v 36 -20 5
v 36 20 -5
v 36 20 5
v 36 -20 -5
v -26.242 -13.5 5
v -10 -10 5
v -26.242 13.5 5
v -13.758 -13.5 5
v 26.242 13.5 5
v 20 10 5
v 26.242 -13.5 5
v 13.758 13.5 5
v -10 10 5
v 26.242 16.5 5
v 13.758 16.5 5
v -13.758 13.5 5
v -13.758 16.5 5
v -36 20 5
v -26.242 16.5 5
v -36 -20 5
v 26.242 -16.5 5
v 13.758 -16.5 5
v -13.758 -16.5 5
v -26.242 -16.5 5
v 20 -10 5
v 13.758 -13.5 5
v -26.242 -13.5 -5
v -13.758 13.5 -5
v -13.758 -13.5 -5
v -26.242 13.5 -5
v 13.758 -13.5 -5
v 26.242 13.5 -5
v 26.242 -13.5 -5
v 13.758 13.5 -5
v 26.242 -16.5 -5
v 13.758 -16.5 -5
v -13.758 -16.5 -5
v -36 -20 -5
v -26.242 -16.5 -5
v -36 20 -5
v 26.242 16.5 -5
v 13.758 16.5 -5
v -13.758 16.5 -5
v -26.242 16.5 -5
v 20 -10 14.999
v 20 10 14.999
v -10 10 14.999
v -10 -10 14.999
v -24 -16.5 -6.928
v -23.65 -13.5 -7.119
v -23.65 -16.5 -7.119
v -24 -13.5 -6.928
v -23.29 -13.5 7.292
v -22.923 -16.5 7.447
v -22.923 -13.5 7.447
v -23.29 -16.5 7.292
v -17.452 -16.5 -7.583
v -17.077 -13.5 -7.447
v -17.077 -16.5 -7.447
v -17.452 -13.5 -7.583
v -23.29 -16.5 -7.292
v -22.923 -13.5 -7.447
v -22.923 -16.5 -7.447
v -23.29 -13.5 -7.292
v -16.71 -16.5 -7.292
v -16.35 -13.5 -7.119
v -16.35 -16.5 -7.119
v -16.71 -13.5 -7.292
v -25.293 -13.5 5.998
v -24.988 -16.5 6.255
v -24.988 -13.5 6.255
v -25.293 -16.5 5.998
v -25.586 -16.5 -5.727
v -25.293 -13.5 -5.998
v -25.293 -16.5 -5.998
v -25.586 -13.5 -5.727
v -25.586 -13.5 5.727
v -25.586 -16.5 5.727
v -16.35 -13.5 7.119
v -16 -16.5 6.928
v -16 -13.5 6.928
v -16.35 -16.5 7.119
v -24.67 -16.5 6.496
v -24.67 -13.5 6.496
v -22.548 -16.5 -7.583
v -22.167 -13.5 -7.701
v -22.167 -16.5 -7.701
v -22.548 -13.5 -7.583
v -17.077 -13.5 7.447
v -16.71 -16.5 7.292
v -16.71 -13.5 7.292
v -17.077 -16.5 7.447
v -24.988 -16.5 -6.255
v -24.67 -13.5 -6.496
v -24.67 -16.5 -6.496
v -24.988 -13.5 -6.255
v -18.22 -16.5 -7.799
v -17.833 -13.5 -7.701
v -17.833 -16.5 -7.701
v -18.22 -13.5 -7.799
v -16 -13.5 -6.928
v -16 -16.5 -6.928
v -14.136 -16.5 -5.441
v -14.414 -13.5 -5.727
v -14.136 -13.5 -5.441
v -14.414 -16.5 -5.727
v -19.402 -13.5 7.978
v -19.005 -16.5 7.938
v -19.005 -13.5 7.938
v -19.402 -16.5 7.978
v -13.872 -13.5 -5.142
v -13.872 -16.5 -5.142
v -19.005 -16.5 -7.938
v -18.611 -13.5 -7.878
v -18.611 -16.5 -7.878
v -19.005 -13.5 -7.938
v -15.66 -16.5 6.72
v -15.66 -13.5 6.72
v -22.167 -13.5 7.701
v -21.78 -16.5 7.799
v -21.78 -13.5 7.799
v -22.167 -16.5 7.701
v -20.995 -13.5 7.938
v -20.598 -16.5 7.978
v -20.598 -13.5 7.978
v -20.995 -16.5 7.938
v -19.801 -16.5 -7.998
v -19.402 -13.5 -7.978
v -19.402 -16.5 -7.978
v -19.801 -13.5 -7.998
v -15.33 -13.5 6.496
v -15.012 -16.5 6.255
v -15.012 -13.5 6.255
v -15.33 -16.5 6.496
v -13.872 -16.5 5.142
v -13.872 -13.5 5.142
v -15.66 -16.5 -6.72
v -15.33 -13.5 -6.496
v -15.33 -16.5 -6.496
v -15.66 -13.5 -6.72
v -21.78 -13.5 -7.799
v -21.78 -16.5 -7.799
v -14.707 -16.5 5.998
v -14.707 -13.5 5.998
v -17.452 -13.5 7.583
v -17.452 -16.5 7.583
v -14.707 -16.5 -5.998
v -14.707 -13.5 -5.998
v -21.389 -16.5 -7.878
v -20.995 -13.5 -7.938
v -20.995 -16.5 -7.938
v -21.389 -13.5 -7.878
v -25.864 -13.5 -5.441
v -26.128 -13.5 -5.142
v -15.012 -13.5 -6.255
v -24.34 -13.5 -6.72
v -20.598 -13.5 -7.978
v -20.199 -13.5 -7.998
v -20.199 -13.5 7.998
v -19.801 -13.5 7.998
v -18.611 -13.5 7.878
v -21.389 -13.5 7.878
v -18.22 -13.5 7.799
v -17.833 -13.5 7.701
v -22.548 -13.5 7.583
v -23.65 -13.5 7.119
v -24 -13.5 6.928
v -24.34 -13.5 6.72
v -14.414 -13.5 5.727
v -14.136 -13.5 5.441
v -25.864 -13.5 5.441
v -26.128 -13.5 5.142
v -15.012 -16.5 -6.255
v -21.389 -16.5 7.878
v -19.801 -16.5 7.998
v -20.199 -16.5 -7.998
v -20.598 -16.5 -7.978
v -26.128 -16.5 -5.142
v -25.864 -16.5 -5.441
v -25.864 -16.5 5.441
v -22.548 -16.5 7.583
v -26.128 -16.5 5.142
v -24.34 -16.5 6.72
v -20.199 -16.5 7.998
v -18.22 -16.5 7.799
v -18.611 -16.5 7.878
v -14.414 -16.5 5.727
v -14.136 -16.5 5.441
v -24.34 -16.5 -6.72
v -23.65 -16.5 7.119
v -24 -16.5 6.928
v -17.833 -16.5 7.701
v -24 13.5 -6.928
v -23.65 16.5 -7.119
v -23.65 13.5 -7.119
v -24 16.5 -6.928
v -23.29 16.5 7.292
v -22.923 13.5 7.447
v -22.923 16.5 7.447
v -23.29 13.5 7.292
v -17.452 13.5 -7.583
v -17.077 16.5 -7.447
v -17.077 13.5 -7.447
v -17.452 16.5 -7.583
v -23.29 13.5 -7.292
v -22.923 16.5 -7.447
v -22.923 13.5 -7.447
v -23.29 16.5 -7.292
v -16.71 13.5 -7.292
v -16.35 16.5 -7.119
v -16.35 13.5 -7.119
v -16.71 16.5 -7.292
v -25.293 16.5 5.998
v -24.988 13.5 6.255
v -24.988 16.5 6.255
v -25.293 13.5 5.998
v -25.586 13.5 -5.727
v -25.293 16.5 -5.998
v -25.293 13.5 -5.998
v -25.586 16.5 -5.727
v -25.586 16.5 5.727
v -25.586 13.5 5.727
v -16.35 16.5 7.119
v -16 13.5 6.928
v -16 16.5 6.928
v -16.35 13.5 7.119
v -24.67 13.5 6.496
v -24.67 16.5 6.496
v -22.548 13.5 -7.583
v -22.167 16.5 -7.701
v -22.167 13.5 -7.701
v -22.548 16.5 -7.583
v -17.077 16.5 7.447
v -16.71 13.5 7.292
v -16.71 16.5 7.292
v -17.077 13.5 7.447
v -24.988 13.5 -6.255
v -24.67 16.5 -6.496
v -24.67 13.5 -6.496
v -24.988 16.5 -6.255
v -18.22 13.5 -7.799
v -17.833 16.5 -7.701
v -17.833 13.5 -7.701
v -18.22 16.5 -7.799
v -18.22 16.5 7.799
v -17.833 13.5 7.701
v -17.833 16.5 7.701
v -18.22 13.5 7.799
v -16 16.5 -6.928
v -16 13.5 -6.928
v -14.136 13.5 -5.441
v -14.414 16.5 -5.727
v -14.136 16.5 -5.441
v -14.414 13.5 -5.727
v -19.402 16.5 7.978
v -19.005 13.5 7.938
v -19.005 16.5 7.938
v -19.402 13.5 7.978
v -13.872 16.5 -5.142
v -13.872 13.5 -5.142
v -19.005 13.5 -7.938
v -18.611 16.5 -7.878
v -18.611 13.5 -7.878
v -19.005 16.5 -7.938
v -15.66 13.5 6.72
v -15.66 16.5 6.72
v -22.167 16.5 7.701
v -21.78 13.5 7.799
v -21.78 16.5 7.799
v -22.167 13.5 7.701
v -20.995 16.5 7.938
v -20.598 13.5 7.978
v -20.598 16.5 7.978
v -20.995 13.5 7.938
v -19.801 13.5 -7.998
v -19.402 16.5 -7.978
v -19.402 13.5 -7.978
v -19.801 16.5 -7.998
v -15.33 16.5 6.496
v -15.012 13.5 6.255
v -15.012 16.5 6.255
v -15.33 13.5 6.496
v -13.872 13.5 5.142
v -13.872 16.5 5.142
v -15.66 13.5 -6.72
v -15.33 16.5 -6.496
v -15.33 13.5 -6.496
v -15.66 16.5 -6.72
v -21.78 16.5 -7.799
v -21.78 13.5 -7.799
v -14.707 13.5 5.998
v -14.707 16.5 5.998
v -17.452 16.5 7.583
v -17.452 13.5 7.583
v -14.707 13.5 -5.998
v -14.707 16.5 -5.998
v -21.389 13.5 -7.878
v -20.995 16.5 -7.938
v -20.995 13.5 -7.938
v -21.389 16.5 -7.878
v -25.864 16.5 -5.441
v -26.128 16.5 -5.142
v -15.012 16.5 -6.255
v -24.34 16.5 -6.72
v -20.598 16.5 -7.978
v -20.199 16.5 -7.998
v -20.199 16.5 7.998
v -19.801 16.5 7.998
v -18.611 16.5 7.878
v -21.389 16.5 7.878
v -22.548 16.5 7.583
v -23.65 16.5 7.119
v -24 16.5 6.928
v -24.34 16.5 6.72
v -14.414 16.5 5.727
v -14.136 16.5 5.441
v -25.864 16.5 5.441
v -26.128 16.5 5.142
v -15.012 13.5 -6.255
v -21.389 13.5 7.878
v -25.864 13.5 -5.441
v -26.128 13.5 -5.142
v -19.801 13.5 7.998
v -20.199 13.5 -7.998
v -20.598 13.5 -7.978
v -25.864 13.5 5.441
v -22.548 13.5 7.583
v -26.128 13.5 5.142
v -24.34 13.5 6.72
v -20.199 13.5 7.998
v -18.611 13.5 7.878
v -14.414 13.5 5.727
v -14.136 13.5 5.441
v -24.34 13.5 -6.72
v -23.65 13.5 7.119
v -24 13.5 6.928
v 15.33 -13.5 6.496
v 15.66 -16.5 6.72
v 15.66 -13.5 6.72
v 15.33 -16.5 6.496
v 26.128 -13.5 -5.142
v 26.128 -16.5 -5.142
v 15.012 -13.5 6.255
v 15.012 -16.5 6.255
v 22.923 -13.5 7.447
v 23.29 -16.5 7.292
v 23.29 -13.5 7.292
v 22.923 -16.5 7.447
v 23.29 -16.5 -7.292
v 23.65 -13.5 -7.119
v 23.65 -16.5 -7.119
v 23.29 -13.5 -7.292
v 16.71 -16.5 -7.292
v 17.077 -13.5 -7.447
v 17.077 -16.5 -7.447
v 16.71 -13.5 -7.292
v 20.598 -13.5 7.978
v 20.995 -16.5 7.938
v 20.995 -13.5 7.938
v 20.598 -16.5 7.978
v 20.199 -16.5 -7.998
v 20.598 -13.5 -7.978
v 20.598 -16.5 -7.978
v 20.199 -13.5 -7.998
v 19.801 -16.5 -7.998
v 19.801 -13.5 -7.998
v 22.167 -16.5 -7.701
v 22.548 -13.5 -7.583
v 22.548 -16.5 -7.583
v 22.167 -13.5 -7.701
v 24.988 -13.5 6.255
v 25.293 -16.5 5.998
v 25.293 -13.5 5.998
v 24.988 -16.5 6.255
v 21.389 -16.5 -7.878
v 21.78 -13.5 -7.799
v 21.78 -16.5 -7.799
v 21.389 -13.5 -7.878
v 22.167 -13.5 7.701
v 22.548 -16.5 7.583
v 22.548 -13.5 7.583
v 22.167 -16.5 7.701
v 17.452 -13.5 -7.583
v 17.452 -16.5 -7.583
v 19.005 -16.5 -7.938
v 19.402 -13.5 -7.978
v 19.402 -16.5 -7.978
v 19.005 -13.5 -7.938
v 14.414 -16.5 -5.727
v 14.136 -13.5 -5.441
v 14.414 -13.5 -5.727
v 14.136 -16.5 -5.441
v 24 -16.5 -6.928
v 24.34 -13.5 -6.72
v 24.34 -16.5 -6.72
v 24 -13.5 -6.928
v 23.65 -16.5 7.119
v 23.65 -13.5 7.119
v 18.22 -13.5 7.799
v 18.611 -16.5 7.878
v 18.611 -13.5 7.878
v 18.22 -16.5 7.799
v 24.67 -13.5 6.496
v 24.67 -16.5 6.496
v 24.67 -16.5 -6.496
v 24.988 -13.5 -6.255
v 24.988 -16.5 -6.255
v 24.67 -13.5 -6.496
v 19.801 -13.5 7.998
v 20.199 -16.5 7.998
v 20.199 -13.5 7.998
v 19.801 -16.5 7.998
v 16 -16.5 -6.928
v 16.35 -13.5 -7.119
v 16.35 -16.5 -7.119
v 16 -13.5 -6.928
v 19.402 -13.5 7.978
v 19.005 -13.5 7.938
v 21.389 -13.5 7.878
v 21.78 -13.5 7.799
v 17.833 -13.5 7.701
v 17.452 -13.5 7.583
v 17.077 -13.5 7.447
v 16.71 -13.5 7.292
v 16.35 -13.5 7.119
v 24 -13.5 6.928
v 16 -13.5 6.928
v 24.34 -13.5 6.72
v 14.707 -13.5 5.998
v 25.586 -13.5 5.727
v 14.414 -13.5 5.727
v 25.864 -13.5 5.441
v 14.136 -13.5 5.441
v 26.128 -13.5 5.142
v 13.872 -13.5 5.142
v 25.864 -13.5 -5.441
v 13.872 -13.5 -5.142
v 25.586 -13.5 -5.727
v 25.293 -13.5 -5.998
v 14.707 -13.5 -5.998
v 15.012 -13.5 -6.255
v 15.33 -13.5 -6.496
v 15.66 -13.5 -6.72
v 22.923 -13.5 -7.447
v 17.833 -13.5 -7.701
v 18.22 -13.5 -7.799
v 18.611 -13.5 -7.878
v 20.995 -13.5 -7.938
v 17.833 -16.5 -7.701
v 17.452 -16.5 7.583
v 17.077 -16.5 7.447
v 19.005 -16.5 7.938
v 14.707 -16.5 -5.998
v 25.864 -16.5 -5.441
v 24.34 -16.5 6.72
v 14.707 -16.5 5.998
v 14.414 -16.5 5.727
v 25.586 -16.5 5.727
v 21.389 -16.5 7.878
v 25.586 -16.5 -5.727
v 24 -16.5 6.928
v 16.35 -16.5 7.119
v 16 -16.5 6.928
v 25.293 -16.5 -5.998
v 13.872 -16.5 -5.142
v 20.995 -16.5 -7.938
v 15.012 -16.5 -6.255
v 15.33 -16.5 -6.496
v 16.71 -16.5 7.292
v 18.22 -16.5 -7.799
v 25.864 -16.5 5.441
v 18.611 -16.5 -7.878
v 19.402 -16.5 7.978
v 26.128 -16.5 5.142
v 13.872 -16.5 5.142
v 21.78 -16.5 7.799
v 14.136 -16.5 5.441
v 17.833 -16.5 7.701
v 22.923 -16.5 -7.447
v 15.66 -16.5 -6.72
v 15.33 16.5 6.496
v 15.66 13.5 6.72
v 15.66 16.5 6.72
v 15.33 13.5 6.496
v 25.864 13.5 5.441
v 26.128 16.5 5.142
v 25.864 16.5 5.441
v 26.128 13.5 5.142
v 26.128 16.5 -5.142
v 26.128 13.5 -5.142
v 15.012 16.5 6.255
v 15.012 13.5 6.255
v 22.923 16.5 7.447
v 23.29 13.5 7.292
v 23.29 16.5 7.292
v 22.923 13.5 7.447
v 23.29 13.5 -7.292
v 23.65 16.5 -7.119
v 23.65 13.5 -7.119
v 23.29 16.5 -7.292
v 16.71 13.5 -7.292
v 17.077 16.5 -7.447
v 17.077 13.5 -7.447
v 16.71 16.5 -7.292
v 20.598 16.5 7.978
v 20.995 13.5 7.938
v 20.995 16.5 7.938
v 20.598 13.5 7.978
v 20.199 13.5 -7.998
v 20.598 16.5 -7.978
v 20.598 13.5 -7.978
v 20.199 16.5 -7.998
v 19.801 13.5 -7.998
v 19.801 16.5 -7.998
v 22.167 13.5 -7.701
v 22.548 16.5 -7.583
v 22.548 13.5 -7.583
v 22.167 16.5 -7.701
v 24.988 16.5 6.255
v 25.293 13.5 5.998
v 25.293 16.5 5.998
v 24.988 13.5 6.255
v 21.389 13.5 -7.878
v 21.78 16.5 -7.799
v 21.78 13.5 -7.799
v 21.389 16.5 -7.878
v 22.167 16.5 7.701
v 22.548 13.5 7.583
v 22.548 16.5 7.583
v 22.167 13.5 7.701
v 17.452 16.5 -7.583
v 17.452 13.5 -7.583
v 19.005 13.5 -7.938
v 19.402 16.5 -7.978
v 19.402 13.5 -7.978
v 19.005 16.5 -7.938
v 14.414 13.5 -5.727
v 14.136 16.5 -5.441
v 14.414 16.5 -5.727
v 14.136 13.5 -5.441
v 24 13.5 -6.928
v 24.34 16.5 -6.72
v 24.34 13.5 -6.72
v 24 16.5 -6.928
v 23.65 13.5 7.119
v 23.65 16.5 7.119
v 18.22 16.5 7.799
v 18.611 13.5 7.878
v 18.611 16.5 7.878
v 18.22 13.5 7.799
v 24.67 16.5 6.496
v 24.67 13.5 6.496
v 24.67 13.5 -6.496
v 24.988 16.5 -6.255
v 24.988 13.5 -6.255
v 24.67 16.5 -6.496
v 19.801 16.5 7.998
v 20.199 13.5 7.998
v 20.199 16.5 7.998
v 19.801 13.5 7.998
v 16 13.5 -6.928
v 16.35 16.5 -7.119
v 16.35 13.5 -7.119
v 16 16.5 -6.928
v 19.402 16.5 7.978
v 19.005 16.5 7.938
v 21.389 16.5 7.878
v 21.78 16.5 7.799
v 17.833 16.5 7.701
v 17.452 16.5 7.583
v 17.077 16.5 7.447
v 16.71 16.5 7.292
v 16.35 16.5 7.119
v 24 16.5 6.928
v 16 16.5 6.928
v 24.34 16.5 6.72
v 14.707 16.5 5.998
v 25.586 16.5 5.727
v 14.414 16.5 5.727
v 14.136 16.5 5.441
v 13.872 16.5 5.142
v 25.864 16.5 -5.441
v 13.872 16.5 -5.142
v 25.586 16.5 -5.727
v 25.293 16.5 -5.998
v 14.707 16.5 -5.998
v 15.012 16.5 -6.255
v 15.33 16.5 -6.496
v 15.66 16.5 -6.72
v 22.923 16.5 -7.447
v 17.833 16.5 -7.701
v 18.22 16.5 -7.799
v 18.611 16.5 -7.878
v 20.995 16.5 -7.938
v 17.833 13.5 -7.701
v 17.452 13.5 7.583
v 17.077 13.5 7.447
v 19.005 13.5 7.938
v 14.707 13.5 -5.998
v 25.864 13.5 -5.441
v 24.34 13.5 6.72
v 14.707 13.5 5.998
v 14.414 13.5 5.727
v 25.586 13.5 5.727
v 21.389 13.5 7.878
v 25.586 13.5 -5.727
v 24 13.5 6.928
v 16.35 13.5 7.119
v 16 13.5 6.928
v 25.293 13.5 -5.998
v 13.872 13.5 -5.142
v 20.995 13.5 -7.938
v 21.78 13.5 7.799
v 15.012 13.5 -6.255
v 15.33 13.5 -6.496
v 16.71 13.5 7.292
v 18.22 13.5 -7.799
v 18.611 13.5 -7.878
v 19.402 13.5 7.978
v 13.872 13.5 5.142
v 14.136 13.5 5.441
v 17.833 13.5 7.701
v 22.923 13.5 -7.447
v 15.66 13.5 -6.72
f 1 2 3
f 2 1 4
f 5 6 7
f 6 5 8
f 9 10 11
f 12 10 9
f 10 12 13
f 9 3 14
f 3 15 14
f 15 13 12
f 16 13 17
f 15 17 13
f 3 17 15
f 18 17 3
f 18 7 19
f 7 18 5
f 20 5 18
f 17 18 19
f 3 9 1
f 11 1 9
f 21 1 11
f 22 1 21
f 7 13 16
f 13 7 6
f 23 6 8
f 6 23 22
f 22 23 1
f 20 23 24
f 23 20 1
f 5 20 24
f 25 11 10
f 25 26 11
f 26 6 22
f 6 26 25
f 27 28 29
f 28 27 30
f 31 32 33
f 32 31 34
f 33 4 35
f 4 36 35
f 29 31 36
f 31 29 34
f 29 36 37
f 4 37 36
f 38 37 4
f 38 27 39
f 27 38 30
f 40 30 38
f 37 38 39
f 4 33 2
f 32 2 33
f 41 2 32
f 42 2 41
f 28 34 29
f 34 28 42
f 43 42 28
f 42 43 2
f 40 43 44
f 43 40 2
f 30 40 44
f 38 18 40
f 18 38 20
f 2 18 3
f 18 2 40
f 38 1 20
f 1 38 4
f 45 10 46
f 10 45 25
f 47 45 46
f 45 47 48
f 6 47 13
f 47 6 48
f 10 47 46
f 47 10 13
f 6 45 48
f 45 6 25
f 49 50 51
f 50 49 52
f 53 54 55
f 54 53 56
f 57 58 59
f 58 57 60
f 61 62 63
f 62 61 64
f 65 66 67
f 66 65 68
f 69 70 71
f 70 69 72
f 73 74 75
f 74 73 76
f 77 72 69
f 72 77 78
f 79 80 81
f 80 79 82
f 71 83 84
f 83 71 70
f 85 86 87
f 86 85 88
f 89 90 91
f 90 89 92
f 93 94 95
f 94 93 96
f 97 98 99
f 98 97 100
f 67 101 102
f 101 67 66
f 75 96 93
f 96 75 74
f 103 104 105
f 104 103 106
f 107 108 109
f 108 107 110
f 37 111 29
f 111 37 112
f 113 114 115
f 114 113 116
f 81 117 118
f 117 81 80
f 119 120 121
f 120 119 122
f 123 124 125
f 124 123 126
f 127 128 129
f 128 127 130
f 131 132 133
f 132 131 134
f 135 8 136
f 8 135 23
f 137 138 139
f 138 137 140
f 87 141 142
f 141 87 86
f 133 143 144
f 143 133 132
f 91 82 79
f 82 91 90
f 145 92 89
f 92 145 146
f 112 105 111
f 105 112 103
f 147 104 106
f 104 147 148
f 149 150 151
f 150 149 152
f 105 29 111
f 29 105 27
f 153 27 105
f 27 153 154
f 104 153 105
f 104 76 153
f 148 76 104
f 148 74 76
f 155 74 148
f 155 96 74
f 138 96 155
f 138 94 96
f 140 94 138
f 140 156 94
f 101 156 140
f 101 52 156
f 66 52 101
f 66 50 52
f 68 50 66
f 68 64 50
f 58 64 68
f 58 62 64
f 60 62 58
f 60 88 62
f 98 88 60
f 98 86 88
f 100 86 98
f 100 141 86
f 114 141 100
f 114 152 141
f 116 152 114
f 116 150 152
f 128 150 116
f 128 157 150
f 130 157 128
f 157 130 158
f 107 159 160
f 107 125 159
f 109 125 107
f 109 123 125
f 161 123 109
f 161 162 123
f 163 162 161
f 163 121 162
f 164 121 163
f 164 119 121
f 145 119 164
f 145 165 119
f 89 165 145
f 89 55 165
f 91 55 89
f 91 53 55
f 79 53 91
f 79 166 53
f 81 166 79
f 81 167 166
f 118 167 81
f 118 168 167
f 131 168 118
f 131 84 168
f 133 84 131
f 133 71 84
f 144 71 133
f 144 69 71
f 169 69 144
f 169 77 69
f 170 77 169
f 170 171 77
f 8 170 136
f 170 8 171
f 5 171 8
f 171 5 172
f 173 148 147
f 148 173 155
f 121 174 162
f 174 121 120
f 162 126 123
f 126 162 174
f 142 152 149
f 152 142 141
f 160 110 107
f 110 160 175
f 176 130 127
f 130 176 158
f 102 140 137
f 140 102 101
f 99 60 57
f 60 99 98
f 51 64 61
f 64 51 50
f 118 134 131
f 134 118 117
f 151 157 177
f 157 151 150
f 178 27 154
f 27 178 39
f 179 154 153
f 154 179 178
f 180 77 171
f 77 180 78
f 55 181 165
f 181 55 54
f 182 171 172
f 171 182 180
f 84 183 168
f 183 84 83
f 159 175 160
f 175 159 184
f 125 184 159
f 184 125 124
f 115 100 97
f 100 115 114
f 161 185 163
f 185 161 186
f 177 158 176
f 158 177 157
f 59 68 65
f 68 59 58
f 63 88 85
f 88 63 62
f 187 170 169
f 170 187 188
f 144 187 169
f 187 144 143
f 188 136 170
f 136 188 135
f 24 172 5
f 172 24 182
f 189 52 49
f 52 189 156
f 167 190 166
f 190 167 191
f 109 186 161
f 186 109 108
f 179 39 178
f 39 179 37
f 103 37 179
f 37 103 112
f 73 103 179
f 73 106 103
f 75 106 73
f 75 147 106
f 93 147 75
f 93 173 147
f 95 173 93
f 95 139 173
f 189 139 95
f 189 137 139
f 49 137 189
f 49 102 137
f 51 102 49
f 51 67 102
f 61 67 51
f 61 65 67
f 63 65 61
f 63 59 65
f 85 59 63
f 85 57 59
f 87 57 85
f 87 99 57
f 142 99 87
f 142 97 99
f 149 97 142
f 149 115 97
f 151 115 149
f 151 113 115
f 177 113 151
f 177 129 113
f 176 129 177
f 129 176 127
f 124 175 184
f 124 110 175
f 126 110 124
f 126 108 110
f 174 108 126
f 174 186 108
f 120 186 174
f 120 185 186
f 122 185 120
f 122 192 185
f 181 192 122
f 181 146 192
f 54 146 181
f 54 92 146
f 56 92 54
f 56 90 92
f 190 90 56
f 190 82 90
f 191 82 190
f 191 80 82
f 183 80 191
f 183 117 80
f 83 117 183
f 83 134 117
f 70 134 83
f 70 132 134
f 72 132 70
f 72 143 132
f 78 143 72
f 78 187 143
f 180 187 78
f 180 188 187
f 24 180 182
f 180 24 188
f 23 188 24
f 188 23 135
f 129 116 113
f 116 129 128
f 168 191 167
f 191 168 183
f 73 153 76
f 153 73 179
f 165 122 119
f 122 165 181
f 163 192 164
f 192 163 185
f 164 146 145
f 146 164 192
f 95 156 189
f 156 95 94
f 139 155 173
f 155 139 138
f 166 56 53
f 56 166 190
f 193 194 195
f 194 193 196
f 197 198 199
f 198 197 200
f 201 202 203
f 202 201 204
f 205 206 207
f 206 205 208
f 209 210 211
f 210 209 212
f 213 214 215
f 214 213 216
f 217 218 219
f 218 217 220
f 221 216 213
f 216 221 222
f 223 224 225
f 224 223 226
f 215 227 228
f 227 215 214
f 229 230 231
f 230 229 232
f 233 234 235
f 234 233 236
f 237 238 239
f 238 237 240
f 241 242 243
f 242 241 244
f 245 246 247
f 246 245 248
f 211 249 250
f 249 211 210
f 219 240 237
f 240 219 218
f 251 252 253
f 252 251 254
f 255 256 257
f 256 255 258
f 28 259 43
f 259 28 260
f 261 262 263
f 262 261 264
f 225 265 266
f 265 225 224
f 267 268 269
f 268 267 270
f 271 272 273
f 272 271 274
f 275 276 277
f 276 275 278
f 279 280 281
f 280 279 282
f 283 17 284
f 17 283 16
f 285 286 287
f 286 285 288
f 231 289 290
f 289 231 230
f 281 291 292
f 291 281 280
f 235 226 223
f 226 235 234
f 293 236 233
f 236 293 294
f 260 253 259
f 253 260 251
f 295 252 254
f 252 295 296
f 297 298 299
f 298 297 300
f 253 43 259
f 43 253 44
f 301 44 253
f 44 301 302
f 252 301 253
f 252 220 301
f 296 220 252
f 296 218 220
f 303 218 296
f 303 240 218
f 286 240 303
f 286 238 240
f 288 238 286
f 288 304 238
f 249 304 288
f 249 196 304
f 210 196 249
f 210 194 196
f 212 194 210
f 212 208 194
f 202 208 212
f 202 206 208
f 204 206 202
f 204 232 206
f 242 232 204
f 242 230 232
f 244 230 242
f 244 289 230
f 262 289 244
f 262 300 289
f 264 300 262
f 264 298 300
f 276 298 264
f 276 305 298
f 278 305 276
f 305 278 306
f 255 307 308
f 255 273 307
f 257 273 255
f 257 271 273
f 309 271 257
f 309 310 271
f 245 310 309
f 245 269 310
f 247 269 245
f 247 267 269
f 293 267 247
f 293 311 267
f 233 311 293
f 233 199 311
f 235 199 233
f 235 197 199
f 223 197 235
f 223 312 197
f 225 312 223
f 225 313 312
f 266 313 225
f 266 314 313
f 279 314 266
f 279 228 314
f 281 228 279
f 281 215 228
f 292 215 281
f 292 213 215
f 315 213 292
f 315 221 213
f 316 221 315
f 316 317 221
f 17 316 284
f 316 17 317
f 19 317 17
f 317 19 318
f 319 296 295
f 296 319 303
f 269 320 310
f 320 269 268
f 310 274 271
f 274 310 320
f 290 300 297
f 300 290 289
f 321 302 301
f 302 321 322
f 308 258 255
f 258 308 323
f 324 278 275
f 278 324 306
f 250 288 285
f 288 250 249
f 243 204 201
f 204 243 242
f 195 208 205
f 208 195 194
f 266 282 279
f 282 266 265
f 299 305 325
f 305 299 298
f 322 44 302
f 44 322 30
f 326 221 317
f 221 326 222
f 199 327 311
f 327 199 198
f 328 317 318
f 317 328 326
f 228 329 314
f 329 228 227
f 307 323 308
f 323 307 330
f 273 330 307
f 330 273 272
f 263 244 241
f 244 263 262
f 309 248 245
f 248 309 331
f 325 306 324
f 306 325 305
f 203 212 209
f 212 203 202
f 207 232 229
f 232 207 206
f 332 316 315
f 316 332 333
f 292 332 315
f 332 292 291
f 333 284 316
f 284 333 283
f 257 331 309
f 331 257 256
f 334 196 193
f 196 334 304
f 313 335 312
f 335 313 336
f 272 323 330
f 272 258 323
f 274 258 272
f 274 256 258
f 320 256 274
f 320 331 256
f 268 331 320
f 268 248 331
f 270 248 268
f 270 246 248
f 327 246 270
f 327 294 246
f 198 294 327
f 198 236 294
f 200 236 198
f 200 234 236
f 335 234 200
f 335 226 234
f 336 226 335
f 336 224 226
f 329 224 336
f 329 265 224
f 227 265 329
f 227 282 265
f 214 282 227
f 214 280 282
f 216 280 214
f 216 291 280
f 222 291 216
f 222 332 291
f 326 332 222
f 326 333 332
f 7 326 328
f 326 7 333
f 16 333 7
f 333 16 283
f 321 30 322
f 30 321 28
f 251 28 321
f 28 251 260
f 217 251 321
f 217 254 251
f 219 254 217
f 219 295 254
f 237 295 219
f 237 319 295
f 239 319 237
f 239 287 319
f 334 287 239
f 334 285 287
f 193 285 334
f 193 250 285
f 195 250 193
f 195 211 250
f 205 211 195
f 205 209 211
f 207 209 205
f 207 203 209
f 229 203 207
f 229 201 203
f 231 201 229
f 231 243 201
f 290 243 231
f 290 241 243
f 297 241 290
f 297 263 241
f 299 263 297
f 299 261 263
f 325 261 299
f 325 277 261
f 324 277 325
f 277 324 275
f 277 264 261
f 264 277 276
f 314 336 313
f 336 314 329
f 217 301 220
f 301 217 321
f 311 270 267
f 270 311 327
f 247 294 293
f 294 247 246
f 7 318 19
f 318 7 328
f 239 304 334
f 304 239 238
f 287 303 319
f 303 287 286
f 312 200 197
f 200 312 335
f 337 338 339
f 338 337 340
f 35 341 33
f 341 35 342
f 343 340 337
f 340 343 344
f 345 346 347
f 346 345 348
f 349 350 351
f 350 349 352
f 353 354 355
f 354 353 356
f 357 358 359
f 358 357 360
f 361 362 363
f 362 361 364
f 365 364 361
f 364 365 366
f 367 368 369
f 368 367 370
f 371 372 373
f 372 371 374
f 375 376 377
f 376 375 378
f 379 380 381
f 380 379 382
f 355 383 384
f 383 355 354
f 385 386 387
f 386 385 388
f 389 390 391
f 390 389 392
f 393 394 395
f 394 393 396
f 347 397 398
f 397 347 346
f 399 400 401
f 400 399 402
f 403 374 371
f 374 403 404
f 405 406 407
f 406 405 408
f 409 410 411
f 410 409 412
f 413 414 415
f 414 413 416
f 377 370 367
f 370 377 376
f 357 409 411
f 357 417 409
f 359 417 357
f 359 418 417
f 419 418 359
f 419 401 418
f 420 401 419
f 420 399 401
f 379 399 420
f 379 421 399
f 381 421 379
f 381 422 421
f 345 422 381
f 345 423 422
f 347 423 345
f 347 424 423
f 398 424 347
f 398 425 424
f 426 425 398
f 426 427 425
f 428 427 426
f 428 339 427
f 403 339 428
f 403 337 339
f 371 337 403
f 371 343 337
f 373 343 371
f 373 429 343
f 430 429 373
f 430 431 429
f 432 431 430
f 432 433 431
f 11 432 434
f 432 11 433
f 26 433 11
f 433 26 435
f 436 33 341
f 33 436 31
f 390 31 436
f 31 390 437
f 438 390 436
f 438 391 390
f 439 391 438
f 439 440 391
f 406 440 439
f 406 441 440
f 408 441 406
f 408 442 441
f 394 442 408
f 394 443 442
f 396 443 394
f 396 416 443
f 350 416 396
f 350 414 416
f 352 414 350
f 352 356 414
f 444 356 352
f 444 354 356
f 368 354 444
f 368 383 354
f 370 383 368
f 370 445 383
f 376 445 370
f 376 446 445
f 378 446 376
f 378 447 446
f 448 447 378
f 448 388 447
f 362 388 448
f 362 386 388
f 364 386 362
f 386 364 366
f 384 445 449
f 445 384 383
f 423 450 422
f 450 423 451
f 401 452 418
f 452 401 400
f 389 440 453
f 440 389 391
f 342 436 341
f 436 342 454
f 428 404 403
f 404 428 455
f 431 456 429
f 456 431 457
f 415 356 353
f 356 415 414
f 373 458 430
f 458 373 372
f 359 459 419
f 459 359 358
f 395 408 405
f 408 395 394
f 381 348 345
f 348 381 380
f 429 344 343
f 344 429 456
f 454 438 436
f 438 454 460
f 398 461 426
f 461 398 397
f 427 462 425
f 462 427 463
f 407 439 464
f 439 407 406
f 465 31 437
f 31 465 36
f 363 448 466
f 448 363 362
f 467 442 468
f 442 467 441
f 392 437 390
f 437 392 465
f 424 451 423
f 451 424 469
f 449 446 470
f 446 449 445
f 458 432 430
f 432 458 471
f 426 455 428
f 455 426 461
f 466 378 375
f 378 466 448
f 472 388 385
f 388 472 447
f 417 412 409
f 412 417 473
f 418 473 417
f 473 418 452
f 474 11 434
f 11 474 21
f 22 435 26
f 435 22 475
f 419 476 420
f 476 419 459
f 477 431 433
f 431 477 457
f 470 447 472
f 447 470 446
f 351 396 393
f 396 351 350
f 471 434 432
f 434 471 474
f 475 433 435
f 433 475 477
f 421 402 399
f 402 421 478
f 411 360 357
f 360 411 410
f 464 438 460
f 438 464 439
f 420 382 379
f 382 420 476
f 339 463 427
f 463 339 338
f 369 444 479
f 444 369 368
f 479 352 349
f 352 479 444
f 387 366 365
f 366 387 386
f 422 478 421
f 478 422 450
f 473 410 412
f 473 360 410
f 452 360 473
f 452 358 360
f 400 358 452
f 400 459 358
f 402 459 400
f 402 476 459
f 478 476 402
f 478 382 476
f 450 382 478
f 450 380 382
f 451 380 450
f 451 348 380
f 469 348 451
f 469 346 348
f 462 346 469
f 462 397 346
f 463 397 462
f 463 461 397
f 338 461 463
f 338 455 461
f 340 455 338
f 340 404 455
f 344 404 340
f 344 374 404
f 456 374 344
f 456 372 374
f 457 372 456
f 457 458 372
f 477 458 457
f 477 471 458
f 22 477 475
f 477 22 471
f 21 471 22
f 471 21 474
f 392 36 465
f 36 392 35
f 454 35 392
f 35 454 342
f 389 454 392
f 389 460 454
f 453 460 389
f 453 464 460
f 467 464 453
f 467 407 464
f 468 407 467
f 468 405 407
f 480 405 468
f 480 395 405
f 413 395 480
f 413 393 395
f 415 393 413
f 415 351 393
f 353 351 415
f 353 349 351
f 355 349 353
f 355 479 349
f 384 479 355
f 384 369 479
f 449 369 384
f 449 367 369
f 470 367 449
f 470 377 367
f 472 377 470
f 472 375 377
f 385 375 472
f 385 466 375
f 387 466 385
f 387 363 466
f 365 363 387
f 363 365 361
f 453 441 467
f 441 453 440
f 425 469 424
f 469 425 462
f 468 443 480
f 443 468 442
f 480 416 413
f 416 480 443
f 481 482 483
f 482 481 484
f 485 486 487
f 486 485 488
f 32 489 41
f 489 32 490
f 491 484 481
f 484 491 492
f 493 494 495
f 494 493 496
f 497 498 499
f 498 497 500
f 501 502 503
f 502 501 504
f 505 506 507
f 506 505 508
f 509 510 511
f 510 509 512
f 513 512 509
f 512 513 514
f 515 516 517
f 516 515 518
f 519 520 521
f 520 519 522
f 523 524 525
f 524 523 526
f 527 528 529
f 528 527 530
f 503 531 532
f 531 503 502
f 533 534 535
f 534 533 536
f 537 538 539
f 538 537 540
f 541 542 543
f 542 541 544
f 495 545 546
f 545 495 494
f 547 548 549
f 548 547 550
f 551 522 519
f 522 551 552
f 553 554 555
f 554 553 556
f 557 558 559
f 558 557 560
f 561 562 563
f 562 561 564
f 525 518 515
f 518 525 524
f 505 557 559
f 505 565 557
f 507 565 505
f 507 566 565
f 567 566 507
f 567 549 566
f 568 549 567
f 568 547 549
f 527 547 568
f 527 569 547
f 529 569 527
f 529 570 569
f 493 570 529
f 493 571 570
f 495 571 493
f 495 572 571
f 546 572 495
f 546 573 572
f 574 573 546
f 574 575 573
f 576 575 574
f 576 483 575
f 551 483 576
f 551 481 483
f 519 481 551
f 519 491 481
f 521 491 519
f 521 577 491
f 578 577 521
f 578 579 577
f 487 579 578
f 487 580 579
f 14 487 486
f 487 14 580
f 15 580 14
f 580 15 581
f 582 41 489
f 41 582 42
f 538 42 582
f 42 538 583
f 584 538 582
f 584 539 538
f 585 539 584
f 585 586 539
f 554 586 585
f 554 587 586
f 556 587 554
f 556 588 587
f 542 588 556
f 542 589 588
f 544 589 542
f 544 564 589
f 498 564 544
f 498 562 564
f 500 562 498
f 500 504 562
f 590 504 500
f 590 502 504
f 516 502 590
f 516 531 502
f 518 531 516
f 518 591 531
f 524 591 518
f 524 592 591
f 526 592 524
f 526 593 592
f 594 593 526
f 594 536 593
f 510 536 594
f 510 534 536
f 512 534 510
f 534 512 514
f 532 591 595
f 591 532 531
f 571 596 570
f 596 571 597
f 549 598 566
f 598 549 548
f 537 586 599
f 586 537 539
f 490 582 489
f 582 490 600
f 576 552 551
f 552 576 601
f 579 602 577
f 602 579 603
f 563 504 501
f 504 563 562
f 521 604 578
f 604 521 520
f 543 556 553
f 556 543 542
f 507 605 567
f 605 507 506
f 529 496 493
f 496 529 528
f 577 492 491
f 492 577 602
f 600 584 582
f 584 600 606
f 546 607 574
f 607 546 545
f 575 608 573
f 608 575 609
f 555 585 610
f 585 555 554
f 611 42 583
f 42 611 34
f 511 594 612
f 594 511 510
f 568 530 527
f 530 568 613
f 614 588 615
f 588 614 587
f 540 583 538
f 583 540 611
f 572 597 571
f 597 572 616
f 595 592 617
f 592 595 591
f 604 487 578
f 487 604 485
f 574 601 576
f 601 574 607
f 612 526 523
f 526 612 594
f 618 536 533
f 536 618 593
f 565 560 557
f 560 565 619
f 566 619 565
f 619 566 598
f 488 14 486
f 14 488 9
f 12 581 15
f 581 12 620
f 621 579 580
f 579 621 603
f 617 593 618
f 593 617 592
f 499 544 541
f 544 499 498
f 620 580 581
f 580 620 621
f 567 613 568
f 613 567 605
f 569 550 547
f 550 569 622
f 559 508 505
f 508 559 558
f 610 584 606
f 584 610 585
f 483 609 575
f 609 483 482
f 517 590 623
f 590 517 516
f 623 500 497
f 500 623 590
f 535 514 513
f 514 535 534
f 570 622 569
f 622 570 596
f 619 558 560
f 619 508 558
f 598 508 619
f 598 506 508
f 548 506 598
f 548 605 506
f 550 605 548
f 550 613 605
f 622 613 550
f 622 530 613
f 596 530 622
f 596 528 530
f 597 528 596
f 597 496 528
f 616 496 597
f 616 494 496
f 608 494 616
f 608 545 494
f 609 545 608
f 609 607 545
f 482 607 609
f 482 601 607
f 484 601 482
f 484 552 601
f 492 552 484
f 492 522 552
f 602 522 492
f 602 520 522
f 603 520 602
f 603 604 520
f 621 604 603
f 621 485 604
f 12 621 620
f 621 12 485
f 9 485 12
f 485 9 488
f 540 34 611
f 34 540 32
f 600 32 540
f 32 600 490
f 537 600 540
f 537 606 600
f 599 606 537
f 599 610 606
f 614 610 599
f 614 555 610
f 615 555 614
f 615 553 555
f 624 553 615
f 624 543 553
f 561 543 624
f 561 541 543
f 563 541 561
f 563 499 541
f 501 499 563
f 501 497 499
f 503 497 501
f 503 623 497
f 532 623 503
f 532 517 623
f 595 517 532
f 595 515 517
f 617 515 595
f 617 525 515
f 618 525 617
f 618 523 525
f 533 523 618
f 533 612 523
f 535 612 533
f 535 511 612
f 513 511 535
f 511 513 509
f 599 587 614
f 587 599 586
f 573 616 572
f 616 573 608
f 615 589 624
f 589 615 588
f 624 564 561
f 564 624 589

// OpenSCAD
$fa = 1;
$fs = 0.4;
// Car body base
scale([1.2,2,1])
    cube([60,20,10],center=true);
// Car body top
translate([5,0,10 - 0.001])
    cube([30,20,10],center=true);
// Front left wheel
translate([-20,-15,0])
    rotate([90,0,0])
    cylinder(h=3,r=8,center=true);
// Front right wheel
translate([-20,15,0])
    rotate([90,0,0])
    cylinder(h=3,r=8,center=true);
// Rear left wheel
translate([20,-15,0])
    rotate([90,0,0])
    cylinder(h=3,r=8,center=true);
// Rear right wheel
translate([20,15,0])
    rotate([90,0,0])
    cylinder(h=3,r=8,center=true);
// Front axle
translate([-20,0,0])
    rotate([90,0,0])
    cylinder(h=30,r=2,center=true);
// Rear axle
translate([20,0,0])
    rotate([90,0,0])
    cylinder(h=30,r=2,center=true);
